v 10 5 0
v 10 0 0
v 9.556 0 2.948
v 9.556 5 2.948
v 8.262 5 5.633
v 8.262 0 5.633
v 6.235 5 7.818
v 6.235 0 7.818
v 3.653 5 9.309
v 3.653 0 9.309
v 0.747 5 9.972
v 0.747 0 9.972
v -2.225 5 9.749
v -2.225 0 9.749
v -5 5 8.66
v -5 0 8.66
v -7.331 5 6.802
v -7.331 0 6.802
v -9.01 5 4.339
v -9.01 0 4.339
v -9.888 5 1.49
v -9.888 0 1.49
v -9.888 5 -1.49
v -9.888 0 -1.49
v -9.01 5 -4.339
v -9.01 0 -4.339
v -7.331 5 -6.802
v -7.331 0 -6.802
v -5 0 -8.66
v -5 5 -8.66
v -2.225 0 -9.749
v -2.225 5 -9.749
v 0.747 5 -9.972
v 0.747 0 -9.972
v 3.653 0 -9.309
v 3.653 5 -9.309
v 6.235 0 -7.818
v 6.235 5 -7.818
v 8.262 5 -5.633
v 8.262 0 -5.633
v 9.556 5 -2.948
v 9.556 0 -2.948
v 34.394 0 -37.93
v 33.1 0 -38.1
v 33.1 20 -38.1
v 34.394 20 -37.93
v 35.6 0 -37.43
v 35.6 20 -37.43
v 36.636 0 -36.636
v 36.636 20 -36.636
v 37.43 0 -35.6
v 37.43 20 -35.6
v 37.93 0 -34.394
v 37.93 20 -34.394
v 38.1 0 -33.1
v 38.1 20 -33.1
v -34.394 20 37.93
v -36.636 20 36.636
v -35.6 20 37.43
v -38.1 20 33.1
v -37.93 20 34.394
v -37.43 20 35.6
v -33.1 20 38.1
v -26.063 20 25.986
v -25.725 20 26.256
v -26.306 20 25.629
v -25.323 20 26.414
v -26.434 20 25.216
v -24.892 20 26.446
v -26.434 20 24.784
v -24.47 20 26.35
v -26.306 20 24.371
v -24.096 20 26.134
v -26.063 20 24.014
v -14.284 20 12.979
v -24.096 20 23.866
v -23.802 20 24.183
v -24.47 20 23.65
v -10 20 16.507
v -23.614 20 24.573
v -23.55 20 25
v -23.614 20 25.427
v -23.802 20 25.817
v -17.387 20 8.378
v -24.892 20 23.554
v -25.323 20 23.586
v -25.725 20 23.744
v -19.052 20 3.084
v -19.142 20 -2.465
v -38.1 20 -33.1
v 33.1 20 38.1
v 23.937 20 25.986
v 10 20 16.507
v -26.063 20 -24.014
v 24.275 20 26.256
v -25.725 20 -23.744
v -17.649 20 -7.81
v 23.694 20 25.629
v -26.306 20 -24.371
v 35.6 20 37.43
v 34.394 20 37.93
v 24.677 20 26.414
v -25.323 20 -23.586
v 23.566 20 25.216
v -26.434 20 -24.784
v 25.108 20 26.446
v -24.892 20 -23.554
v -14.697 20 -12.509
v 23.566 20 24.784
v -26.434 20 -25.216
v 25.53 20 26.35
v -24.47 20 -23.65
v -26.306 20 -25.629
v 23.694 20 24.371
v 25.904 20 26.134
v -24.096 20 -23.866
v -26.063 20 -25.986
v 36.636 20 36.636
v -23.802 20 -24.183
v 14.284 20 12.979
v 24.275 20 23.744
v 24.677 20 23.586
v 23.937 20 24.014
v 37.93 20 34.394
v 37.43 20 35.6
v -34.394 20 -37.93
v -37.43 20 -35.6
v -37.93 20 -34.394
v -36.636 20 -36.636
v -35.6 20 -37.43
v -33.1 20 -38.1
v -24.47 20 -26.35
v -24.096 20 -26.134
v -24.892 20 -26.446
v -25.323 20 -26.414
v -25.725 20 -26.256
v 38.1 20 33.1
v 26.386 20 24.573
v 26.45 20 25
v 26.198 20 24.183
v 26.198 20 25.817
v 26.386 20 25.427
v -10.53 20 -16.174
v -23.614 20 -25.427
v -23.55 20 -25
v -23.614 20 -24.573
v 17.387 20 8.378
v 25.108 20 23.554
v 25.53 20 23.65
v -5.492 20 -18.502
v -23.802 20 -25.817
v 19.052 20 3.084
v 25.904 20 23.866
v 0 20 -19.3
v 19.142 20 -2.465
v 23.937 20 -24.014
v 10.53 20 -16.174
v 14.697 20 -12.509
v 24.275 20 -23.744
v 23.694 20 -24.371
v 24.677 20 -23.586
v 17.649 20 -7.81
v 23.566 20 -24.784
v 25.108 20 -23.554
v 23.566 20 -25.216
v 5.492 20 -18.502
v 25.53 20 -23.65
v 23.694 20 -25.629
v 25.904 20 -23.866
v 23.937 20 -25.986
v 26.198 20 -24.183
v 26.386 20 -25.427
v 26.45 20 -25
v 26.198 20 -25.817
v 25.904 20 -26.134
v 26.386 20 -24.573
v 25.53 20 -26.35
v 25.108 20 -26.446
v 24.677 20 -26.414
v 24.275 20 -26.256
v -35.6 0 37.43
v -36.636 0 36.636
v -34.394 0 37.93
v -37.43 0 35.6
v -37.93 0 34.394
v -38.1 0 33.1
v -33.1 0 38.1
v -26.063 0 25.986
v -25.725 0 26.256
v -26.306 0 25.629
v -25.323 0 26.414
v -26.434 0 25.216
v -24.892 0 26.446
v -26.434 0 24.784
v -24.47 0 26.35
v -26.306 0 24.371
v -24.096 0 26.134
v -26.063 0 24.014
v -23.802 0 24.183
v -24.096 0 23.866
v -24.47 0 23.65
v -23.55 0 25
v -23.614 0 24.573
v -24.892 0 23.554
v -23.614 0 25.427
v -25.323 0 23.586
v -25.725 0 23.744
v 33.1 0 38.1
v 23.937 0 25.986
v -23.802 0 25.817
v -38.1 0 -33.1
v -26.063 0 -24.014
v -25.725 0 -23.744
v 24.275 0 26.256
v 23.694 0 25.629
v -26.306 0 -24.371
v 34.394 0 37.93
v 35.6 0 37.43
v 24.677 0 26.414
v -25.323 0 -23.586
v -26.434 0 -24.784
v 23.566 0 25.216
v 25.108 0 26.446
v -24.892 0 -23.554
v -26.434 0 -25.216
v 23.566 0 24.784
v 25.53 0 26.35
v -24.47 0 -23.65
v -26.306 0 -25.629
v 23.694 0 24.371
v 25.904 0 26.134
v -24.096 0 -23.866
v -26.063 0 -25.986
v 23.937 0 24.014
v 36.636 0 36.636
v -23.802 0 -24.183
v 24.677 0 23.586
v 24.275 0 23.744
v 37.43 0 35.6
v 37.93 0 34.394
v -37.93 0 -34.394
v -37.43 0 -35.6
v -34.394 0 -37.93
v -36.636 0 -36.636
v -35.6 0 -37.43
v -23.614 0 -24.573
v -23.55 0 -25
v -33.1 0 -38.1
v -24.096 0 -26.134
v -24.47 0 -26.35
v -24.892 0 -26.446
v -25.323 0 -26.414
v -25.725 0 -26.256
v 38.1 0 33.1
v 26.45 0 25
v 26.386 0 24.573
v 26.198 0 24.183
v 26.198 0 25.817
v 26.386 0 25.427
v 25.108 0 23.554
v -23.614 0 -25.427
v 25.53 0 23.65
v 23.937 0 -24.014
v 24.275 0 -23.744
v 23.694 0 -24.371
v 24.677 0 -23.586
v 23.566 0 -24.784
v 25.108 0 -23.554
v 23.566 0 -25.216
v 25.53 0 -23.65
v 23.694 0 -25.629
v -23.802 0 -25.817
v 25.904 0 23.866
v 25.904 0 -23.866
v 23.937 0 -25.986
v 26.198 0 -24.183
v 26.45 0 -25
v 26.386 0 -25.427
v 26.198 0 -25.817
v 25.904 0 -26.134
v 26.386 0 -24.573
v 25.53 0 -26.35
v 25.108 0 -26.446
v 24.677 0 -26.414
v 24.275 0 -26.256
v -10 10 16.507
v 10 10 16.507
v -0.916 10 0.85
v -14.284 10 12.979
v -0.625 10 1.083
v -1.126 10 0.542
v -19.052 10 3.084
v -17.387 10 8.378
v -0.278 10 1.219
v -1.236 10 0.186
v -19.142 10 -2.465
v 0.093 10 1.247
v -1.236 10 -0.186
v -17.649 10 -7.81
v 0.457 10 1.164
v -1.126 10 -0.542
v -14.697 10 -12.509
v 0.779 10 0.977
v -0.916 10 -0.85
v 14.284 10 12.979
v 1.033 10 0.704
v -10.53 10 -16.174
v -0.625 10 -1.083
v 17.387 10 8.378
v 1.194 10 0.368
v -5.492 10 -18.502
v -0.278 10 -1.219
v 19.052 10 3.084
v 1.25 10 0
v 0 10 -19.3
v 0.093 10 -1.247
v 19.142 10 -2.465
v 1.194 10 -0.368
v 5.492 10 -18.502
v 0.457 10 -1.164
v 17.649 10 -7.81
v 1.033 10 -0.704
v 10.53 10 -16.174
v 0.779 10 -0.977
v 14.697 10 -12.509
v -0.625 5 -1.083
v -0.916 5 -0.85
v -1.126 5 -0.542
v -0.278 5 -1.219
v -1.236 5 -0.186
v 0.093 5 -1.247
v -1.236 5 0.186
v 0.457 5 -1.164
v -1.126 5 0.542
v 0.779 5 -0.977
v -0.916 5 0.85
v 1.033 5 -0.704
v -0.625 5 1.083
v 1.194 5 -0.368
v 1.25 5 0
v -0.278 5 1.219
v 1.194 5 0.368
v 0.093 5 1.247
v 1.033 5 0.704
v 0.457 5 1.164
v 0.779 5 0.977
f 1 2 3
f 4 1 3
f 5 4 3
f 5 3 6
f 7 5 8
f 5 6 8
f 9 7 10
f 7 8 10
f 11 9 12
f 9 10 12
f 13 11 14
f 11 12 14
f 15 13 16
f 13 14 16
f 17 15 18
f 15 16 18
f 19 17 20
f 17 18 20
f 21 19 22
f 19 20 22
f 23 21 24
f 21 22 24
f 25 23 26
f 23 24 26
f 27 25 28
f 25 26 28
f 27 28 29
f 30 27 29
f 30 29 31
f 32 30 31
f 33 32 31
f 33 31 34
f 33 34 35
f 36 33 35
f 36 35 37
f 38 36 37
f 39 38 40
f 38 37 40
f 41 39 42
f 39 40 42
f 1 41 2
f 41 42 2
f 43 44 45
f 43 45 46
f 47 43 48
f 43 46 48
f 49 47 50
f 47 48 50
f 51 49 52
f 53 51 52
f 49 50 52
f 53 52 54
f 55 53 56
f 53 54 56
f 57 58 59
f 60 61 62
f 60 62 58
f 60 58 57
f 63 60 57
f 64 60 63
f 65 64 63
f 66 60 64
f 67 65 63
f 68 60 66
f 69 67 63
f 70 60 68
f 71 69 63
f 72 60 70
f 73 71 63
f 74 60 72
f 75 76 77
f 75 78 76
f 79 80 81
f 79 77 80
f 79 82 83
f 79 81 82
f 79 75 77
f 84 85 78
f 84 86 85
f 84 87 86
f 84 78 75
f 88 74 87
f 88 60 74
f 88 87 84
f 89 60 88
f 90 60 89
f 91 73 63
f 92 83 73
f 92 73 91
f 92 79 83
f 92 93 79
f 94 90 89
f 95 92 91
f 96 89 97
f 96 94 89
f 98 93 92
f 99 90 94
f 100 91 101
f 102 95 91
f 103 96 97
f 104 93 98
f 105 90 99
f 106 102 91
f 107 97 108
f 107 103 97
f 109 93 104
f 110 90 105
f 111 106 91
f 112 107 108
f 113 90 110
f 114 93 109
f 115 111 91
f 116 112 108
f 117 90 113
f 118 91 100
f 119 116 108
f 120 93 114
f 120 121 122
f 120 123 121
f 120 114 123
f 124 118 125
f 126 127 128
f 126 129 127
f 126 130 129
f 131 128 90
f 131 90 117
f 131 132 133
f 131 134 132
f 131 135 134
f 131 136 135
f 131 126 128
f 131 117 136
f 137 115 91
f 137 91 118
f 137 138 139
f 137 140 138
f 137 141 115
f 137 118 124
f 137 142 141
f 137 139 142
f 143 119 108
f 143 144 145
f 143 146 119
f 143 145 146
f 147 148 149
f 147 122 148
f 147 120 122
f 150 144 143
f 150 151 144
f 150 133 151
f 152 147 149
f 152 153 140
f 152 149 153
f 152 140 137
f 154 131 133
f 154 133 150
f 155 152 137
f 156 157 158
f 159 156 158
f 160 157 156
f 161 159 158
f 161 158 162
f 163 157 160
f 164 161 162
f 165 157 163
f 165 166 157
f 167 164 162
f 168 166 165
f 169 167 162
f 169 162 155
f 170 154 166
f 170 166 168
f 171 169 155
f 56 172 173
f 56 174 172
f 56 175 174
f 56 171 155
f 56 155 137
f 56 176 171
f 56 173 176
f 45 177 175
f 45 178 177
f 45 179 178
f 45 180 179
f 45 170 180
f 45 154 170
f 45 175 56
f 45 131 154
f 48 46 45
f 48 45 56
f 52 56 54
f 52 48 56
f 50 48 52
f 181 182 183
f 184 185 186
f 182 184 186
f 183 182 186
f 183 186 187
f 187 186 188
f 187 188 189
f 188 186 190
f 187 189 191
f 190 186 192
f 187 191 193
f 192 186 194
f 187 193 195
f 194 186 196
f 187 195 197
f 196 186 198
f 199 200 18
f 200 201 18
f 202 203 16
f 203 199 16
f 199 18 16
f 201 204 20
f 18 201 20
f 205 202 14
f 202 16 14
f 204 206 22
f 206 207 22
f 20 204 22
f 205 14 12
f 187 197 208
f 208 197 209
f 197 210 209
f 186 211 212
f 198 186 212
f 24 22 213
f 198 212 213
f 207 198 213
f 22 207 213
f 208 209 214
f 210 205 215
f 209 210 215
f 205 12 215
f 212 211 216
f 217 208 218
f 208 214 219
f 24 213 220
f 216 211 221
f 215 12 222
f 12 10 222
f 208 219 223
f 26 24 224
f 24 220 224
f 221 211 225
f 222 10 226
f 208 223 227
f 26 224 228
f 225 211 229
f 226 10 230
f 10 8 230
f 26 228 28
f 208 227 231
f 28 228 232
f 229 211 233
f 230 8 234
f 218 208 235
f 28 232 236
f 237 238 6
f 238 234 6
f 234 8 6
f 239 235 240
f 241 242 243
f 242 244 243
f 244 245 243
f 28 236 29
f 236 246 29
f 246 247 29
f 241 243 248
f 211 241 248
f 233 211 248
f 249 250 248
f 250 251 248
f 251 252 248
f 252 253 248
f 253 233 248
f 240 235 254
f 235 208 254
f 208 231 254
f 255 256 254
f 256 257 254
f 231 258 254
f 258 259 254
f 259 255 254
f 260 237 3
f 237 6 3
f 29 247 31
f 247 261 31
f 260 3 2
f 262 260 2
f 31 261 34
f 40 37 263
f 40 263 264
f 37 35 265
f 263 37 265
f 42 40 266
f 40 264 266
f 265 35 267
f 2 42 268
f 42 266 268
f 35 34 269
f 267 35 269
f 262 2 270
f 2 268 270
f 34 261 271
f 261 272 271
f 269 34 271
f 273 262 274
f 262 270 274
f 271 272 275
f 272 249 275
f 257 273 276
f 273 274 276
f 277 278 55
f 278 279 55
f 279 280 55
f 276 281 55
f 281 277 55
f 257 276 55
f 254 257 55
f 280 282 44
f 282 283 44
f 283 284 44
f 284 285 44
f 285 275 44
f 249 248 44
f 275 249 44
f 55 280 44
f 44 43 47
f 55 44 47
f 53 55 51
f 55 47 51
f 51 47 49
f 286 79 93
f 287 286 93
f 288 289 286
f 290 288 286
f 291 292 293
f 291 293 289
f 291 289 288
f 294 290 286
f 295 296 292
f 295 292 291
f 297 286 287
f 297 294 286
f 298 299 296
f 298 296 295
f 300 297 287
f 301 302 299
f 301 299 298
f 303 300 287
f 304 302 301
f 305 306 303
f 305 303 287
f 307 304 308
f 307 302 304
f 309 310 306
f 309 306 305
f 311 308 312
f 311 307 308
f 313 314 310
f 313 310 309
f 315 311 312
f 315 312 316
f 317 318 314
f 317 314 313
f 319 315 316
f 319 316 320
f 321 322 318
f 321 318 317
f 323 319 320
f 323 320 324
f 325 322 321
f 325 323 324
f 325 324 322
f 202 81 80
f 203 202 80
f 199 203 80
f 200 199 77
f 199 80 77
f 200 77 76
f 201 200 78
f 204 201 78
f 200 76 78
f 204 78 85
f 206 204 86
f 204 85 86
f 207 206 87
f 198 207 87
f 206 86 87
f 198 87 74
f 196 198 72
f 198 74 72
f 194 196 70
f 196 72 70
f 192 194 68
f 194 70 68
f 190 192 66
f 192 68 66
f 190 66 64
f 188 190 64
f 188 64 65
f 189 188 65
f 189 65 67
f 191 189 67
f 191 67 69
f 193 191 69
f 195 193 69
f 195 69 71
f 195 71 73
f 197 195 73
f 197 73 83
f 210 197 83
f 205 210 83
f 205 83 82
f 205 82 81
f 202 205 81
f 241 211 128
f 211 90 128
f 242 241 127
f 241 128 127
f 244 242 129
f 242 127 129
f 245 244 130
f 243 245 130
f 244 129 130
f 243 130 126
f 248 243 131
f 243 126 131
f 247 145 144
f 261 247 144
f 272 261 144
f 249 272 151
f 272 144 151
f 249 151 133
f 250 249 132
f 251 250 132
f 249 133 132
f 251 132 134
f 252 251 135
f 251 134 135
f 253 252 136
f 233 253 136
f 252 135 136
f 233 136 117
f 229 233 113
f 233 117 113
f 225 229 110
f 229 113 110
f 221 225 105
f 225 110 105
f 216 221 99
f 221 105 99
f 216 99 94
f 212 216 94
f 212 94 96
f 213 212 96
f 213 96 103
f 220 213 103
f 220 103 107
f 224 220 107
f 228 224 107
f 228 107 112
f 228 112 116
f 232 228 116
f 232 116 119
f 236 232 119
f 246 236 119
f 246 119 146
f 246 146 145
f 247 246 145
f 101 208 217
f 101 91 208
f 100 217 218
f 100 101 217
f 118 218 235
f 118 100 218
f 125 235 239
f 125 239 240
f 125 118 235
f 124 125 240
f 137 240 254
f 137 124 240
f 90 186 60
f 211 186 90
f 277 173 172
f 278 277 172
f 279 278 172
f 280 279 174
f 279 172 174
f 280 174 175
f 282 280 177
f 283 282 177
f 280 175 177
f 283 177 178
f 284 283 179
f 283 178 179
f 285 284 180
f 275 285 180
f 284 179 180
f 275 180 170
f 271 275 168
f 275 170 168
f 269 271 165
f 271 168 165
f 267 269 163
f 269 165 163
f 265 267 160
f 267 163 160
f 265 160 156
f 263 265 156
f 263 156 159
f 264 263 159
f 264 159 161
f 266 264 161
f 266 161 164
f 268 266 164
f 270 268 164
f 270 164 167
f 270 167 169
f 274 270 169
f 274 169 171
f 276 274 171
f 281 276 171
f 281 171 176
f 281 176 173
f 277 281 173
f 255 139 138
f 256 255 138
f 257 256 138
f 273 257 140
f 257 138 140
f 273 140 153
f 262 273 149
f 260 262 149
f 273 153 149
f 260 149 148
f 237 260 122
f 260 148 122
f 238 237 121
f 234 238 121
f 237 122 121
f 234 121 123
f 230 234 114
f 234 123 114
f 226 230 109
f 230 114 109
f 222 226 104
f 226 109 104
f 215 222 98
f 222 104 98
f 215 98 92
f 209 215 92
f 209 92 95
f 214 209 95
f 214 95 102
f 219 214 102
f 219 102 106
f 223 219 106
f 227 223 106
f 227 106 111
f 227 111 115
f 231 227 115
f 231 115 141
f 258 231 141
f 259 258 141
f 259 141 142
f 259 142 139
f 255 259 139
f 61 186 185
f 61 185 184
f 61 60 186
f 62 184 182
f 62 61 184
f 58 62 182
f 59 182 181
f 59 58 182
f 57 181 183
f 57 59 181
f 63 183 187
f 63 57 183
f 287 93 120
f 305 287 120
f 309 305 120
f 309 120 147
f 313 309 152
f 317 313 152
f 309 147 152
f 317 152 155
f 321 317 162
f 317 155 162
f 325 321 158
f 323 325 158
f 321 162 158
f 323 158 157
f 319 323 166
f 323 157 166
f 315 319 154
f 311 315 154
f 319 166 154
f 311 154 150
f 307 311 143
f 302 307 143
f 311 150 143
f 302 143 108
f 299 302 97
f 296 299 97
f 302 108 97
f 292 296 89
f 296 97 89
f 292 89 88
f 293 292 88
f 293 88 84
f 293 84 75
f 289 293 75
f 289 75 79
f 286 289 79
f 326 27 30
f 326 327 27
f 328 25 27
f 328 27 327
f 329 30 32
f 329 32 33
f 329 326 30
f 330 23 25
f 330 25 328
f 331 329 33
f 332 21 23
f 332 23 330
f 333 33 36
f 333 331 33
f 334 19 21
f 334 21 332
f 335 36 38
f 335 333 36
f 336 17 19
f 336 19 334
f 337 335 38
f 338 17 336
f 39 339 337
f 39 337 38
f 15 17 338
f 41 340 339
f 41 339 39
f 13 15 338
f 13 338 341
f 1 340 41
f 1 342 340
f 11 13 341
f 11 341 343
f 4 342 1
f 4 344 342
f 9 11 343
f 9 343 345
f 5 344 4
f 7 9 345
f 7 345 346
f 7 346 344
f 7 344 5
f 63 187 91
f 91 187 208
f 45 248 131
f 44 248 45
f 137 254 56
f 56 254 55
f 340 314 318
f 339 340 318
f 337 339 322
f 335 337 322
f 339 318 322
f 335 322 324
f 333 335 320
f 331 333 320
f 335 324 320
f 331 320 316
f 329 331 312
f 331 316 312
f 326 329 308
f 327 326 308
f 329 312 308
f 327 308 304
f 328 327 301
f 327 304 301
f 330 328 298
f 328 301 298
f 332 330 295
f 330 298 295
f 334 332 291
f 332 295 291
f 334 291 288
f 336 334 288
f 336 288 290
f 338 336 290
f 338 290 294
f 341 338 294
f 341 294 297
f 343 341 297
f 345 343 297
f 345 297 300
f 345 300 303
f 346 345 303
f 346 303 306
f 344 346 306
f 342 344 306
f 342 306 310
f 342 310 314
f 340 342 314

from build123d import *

# Parameters (mm, degrees)
SKETCH2_W                     = 76.2
SKETCH2_H                     = 76.2
BOSS_EXTRUDE1_DEPTH           = 20
CUT_EXTRUDE1_DEPTH            = 10
SKETCH4_R                     = 10
CUT_EXTRUDE2_DEPTH            = 5
TAP_DRILL_FOR_M3X0_5_TAP1_D   = 2.5
FILLET1_R                     = 5
TAP_DRILL_FOR_M3_5X0_6_TAP1_D = 2.9


with BuildPart() as part:
    # Sketch2 → Boss-Extrude1 (new body)
    with BuildSketch(Plane(origin=(0, 0, 0), x_dir=(1, 0, 0), z_dir=(0, 1, 0))):
        Rectangle(SKETCH2_W, SKETCH2_H)
    extrude(amount=BOSS_EXTRUDE1_DEPTH)

    # Sketch3 → Cut-Extrude1 (cut)
    with BuildSketch(Plane(origin=(0, 20, 0), x_dir=(1, 0, 0), z_dir=(0, 1, 0))):
        with BuildLine():
            Line((-10, -16.507271125), (10, -16.507271125))
            ThreePointArc((10, -16.507271125), (0, 19.3), (-10, -16.507271125))
        make_face()
    extrude(amount=-CUT_EXTRUDE1_DEPTH, mode=Mode.SUBTRACT)

    # Sketch4 → Cut-Extrude2 (cut)
    with BuildSketch(Plane.XZ):
        Circle(SKETCH4_R)
    extrude(amount=-CUT_EXTRUDE2_DEPTH, mode=Mode.SUBTRACT)

    # Tap Drill for M3x0.5 Tap1 (through all)
    with Locations(Plane(origin=(0, 5, 0), x_dir=(-1, 0, 0), z_dir=(0, -1, 0))):
        with Locations((0, 0)):
            Hole(TAP_DRILL_FOR_M3X0_5_TAP1_D / 2)

    # Fillet1
    fillet1_edges = [part.edges().sort_by_distance(p)[0] for p in [
        (38.1, 10, 38.1),
        (-38.1, 10, 38.1),
        (-38.1, 10, -38.1),
        (38.1, 10, -38.1),
    ]]
    fillet(fillet1_edges, radius=FILLET1_R)

    # Tap Drill for M3.5x0.6 Tap1 (through all)
    with Locations(Plane(origin=(0, 0, 0), x_dir=(-1, 0, 0), z_dir=(0, -1, 0))):
        with Locations((25, 25), (-25, -25), (-25, 25), (25, -25)):
            Hole(TAP_DRILL_FOR_M3_5X0_6_TAP1_D / 2)


solid = part.part
